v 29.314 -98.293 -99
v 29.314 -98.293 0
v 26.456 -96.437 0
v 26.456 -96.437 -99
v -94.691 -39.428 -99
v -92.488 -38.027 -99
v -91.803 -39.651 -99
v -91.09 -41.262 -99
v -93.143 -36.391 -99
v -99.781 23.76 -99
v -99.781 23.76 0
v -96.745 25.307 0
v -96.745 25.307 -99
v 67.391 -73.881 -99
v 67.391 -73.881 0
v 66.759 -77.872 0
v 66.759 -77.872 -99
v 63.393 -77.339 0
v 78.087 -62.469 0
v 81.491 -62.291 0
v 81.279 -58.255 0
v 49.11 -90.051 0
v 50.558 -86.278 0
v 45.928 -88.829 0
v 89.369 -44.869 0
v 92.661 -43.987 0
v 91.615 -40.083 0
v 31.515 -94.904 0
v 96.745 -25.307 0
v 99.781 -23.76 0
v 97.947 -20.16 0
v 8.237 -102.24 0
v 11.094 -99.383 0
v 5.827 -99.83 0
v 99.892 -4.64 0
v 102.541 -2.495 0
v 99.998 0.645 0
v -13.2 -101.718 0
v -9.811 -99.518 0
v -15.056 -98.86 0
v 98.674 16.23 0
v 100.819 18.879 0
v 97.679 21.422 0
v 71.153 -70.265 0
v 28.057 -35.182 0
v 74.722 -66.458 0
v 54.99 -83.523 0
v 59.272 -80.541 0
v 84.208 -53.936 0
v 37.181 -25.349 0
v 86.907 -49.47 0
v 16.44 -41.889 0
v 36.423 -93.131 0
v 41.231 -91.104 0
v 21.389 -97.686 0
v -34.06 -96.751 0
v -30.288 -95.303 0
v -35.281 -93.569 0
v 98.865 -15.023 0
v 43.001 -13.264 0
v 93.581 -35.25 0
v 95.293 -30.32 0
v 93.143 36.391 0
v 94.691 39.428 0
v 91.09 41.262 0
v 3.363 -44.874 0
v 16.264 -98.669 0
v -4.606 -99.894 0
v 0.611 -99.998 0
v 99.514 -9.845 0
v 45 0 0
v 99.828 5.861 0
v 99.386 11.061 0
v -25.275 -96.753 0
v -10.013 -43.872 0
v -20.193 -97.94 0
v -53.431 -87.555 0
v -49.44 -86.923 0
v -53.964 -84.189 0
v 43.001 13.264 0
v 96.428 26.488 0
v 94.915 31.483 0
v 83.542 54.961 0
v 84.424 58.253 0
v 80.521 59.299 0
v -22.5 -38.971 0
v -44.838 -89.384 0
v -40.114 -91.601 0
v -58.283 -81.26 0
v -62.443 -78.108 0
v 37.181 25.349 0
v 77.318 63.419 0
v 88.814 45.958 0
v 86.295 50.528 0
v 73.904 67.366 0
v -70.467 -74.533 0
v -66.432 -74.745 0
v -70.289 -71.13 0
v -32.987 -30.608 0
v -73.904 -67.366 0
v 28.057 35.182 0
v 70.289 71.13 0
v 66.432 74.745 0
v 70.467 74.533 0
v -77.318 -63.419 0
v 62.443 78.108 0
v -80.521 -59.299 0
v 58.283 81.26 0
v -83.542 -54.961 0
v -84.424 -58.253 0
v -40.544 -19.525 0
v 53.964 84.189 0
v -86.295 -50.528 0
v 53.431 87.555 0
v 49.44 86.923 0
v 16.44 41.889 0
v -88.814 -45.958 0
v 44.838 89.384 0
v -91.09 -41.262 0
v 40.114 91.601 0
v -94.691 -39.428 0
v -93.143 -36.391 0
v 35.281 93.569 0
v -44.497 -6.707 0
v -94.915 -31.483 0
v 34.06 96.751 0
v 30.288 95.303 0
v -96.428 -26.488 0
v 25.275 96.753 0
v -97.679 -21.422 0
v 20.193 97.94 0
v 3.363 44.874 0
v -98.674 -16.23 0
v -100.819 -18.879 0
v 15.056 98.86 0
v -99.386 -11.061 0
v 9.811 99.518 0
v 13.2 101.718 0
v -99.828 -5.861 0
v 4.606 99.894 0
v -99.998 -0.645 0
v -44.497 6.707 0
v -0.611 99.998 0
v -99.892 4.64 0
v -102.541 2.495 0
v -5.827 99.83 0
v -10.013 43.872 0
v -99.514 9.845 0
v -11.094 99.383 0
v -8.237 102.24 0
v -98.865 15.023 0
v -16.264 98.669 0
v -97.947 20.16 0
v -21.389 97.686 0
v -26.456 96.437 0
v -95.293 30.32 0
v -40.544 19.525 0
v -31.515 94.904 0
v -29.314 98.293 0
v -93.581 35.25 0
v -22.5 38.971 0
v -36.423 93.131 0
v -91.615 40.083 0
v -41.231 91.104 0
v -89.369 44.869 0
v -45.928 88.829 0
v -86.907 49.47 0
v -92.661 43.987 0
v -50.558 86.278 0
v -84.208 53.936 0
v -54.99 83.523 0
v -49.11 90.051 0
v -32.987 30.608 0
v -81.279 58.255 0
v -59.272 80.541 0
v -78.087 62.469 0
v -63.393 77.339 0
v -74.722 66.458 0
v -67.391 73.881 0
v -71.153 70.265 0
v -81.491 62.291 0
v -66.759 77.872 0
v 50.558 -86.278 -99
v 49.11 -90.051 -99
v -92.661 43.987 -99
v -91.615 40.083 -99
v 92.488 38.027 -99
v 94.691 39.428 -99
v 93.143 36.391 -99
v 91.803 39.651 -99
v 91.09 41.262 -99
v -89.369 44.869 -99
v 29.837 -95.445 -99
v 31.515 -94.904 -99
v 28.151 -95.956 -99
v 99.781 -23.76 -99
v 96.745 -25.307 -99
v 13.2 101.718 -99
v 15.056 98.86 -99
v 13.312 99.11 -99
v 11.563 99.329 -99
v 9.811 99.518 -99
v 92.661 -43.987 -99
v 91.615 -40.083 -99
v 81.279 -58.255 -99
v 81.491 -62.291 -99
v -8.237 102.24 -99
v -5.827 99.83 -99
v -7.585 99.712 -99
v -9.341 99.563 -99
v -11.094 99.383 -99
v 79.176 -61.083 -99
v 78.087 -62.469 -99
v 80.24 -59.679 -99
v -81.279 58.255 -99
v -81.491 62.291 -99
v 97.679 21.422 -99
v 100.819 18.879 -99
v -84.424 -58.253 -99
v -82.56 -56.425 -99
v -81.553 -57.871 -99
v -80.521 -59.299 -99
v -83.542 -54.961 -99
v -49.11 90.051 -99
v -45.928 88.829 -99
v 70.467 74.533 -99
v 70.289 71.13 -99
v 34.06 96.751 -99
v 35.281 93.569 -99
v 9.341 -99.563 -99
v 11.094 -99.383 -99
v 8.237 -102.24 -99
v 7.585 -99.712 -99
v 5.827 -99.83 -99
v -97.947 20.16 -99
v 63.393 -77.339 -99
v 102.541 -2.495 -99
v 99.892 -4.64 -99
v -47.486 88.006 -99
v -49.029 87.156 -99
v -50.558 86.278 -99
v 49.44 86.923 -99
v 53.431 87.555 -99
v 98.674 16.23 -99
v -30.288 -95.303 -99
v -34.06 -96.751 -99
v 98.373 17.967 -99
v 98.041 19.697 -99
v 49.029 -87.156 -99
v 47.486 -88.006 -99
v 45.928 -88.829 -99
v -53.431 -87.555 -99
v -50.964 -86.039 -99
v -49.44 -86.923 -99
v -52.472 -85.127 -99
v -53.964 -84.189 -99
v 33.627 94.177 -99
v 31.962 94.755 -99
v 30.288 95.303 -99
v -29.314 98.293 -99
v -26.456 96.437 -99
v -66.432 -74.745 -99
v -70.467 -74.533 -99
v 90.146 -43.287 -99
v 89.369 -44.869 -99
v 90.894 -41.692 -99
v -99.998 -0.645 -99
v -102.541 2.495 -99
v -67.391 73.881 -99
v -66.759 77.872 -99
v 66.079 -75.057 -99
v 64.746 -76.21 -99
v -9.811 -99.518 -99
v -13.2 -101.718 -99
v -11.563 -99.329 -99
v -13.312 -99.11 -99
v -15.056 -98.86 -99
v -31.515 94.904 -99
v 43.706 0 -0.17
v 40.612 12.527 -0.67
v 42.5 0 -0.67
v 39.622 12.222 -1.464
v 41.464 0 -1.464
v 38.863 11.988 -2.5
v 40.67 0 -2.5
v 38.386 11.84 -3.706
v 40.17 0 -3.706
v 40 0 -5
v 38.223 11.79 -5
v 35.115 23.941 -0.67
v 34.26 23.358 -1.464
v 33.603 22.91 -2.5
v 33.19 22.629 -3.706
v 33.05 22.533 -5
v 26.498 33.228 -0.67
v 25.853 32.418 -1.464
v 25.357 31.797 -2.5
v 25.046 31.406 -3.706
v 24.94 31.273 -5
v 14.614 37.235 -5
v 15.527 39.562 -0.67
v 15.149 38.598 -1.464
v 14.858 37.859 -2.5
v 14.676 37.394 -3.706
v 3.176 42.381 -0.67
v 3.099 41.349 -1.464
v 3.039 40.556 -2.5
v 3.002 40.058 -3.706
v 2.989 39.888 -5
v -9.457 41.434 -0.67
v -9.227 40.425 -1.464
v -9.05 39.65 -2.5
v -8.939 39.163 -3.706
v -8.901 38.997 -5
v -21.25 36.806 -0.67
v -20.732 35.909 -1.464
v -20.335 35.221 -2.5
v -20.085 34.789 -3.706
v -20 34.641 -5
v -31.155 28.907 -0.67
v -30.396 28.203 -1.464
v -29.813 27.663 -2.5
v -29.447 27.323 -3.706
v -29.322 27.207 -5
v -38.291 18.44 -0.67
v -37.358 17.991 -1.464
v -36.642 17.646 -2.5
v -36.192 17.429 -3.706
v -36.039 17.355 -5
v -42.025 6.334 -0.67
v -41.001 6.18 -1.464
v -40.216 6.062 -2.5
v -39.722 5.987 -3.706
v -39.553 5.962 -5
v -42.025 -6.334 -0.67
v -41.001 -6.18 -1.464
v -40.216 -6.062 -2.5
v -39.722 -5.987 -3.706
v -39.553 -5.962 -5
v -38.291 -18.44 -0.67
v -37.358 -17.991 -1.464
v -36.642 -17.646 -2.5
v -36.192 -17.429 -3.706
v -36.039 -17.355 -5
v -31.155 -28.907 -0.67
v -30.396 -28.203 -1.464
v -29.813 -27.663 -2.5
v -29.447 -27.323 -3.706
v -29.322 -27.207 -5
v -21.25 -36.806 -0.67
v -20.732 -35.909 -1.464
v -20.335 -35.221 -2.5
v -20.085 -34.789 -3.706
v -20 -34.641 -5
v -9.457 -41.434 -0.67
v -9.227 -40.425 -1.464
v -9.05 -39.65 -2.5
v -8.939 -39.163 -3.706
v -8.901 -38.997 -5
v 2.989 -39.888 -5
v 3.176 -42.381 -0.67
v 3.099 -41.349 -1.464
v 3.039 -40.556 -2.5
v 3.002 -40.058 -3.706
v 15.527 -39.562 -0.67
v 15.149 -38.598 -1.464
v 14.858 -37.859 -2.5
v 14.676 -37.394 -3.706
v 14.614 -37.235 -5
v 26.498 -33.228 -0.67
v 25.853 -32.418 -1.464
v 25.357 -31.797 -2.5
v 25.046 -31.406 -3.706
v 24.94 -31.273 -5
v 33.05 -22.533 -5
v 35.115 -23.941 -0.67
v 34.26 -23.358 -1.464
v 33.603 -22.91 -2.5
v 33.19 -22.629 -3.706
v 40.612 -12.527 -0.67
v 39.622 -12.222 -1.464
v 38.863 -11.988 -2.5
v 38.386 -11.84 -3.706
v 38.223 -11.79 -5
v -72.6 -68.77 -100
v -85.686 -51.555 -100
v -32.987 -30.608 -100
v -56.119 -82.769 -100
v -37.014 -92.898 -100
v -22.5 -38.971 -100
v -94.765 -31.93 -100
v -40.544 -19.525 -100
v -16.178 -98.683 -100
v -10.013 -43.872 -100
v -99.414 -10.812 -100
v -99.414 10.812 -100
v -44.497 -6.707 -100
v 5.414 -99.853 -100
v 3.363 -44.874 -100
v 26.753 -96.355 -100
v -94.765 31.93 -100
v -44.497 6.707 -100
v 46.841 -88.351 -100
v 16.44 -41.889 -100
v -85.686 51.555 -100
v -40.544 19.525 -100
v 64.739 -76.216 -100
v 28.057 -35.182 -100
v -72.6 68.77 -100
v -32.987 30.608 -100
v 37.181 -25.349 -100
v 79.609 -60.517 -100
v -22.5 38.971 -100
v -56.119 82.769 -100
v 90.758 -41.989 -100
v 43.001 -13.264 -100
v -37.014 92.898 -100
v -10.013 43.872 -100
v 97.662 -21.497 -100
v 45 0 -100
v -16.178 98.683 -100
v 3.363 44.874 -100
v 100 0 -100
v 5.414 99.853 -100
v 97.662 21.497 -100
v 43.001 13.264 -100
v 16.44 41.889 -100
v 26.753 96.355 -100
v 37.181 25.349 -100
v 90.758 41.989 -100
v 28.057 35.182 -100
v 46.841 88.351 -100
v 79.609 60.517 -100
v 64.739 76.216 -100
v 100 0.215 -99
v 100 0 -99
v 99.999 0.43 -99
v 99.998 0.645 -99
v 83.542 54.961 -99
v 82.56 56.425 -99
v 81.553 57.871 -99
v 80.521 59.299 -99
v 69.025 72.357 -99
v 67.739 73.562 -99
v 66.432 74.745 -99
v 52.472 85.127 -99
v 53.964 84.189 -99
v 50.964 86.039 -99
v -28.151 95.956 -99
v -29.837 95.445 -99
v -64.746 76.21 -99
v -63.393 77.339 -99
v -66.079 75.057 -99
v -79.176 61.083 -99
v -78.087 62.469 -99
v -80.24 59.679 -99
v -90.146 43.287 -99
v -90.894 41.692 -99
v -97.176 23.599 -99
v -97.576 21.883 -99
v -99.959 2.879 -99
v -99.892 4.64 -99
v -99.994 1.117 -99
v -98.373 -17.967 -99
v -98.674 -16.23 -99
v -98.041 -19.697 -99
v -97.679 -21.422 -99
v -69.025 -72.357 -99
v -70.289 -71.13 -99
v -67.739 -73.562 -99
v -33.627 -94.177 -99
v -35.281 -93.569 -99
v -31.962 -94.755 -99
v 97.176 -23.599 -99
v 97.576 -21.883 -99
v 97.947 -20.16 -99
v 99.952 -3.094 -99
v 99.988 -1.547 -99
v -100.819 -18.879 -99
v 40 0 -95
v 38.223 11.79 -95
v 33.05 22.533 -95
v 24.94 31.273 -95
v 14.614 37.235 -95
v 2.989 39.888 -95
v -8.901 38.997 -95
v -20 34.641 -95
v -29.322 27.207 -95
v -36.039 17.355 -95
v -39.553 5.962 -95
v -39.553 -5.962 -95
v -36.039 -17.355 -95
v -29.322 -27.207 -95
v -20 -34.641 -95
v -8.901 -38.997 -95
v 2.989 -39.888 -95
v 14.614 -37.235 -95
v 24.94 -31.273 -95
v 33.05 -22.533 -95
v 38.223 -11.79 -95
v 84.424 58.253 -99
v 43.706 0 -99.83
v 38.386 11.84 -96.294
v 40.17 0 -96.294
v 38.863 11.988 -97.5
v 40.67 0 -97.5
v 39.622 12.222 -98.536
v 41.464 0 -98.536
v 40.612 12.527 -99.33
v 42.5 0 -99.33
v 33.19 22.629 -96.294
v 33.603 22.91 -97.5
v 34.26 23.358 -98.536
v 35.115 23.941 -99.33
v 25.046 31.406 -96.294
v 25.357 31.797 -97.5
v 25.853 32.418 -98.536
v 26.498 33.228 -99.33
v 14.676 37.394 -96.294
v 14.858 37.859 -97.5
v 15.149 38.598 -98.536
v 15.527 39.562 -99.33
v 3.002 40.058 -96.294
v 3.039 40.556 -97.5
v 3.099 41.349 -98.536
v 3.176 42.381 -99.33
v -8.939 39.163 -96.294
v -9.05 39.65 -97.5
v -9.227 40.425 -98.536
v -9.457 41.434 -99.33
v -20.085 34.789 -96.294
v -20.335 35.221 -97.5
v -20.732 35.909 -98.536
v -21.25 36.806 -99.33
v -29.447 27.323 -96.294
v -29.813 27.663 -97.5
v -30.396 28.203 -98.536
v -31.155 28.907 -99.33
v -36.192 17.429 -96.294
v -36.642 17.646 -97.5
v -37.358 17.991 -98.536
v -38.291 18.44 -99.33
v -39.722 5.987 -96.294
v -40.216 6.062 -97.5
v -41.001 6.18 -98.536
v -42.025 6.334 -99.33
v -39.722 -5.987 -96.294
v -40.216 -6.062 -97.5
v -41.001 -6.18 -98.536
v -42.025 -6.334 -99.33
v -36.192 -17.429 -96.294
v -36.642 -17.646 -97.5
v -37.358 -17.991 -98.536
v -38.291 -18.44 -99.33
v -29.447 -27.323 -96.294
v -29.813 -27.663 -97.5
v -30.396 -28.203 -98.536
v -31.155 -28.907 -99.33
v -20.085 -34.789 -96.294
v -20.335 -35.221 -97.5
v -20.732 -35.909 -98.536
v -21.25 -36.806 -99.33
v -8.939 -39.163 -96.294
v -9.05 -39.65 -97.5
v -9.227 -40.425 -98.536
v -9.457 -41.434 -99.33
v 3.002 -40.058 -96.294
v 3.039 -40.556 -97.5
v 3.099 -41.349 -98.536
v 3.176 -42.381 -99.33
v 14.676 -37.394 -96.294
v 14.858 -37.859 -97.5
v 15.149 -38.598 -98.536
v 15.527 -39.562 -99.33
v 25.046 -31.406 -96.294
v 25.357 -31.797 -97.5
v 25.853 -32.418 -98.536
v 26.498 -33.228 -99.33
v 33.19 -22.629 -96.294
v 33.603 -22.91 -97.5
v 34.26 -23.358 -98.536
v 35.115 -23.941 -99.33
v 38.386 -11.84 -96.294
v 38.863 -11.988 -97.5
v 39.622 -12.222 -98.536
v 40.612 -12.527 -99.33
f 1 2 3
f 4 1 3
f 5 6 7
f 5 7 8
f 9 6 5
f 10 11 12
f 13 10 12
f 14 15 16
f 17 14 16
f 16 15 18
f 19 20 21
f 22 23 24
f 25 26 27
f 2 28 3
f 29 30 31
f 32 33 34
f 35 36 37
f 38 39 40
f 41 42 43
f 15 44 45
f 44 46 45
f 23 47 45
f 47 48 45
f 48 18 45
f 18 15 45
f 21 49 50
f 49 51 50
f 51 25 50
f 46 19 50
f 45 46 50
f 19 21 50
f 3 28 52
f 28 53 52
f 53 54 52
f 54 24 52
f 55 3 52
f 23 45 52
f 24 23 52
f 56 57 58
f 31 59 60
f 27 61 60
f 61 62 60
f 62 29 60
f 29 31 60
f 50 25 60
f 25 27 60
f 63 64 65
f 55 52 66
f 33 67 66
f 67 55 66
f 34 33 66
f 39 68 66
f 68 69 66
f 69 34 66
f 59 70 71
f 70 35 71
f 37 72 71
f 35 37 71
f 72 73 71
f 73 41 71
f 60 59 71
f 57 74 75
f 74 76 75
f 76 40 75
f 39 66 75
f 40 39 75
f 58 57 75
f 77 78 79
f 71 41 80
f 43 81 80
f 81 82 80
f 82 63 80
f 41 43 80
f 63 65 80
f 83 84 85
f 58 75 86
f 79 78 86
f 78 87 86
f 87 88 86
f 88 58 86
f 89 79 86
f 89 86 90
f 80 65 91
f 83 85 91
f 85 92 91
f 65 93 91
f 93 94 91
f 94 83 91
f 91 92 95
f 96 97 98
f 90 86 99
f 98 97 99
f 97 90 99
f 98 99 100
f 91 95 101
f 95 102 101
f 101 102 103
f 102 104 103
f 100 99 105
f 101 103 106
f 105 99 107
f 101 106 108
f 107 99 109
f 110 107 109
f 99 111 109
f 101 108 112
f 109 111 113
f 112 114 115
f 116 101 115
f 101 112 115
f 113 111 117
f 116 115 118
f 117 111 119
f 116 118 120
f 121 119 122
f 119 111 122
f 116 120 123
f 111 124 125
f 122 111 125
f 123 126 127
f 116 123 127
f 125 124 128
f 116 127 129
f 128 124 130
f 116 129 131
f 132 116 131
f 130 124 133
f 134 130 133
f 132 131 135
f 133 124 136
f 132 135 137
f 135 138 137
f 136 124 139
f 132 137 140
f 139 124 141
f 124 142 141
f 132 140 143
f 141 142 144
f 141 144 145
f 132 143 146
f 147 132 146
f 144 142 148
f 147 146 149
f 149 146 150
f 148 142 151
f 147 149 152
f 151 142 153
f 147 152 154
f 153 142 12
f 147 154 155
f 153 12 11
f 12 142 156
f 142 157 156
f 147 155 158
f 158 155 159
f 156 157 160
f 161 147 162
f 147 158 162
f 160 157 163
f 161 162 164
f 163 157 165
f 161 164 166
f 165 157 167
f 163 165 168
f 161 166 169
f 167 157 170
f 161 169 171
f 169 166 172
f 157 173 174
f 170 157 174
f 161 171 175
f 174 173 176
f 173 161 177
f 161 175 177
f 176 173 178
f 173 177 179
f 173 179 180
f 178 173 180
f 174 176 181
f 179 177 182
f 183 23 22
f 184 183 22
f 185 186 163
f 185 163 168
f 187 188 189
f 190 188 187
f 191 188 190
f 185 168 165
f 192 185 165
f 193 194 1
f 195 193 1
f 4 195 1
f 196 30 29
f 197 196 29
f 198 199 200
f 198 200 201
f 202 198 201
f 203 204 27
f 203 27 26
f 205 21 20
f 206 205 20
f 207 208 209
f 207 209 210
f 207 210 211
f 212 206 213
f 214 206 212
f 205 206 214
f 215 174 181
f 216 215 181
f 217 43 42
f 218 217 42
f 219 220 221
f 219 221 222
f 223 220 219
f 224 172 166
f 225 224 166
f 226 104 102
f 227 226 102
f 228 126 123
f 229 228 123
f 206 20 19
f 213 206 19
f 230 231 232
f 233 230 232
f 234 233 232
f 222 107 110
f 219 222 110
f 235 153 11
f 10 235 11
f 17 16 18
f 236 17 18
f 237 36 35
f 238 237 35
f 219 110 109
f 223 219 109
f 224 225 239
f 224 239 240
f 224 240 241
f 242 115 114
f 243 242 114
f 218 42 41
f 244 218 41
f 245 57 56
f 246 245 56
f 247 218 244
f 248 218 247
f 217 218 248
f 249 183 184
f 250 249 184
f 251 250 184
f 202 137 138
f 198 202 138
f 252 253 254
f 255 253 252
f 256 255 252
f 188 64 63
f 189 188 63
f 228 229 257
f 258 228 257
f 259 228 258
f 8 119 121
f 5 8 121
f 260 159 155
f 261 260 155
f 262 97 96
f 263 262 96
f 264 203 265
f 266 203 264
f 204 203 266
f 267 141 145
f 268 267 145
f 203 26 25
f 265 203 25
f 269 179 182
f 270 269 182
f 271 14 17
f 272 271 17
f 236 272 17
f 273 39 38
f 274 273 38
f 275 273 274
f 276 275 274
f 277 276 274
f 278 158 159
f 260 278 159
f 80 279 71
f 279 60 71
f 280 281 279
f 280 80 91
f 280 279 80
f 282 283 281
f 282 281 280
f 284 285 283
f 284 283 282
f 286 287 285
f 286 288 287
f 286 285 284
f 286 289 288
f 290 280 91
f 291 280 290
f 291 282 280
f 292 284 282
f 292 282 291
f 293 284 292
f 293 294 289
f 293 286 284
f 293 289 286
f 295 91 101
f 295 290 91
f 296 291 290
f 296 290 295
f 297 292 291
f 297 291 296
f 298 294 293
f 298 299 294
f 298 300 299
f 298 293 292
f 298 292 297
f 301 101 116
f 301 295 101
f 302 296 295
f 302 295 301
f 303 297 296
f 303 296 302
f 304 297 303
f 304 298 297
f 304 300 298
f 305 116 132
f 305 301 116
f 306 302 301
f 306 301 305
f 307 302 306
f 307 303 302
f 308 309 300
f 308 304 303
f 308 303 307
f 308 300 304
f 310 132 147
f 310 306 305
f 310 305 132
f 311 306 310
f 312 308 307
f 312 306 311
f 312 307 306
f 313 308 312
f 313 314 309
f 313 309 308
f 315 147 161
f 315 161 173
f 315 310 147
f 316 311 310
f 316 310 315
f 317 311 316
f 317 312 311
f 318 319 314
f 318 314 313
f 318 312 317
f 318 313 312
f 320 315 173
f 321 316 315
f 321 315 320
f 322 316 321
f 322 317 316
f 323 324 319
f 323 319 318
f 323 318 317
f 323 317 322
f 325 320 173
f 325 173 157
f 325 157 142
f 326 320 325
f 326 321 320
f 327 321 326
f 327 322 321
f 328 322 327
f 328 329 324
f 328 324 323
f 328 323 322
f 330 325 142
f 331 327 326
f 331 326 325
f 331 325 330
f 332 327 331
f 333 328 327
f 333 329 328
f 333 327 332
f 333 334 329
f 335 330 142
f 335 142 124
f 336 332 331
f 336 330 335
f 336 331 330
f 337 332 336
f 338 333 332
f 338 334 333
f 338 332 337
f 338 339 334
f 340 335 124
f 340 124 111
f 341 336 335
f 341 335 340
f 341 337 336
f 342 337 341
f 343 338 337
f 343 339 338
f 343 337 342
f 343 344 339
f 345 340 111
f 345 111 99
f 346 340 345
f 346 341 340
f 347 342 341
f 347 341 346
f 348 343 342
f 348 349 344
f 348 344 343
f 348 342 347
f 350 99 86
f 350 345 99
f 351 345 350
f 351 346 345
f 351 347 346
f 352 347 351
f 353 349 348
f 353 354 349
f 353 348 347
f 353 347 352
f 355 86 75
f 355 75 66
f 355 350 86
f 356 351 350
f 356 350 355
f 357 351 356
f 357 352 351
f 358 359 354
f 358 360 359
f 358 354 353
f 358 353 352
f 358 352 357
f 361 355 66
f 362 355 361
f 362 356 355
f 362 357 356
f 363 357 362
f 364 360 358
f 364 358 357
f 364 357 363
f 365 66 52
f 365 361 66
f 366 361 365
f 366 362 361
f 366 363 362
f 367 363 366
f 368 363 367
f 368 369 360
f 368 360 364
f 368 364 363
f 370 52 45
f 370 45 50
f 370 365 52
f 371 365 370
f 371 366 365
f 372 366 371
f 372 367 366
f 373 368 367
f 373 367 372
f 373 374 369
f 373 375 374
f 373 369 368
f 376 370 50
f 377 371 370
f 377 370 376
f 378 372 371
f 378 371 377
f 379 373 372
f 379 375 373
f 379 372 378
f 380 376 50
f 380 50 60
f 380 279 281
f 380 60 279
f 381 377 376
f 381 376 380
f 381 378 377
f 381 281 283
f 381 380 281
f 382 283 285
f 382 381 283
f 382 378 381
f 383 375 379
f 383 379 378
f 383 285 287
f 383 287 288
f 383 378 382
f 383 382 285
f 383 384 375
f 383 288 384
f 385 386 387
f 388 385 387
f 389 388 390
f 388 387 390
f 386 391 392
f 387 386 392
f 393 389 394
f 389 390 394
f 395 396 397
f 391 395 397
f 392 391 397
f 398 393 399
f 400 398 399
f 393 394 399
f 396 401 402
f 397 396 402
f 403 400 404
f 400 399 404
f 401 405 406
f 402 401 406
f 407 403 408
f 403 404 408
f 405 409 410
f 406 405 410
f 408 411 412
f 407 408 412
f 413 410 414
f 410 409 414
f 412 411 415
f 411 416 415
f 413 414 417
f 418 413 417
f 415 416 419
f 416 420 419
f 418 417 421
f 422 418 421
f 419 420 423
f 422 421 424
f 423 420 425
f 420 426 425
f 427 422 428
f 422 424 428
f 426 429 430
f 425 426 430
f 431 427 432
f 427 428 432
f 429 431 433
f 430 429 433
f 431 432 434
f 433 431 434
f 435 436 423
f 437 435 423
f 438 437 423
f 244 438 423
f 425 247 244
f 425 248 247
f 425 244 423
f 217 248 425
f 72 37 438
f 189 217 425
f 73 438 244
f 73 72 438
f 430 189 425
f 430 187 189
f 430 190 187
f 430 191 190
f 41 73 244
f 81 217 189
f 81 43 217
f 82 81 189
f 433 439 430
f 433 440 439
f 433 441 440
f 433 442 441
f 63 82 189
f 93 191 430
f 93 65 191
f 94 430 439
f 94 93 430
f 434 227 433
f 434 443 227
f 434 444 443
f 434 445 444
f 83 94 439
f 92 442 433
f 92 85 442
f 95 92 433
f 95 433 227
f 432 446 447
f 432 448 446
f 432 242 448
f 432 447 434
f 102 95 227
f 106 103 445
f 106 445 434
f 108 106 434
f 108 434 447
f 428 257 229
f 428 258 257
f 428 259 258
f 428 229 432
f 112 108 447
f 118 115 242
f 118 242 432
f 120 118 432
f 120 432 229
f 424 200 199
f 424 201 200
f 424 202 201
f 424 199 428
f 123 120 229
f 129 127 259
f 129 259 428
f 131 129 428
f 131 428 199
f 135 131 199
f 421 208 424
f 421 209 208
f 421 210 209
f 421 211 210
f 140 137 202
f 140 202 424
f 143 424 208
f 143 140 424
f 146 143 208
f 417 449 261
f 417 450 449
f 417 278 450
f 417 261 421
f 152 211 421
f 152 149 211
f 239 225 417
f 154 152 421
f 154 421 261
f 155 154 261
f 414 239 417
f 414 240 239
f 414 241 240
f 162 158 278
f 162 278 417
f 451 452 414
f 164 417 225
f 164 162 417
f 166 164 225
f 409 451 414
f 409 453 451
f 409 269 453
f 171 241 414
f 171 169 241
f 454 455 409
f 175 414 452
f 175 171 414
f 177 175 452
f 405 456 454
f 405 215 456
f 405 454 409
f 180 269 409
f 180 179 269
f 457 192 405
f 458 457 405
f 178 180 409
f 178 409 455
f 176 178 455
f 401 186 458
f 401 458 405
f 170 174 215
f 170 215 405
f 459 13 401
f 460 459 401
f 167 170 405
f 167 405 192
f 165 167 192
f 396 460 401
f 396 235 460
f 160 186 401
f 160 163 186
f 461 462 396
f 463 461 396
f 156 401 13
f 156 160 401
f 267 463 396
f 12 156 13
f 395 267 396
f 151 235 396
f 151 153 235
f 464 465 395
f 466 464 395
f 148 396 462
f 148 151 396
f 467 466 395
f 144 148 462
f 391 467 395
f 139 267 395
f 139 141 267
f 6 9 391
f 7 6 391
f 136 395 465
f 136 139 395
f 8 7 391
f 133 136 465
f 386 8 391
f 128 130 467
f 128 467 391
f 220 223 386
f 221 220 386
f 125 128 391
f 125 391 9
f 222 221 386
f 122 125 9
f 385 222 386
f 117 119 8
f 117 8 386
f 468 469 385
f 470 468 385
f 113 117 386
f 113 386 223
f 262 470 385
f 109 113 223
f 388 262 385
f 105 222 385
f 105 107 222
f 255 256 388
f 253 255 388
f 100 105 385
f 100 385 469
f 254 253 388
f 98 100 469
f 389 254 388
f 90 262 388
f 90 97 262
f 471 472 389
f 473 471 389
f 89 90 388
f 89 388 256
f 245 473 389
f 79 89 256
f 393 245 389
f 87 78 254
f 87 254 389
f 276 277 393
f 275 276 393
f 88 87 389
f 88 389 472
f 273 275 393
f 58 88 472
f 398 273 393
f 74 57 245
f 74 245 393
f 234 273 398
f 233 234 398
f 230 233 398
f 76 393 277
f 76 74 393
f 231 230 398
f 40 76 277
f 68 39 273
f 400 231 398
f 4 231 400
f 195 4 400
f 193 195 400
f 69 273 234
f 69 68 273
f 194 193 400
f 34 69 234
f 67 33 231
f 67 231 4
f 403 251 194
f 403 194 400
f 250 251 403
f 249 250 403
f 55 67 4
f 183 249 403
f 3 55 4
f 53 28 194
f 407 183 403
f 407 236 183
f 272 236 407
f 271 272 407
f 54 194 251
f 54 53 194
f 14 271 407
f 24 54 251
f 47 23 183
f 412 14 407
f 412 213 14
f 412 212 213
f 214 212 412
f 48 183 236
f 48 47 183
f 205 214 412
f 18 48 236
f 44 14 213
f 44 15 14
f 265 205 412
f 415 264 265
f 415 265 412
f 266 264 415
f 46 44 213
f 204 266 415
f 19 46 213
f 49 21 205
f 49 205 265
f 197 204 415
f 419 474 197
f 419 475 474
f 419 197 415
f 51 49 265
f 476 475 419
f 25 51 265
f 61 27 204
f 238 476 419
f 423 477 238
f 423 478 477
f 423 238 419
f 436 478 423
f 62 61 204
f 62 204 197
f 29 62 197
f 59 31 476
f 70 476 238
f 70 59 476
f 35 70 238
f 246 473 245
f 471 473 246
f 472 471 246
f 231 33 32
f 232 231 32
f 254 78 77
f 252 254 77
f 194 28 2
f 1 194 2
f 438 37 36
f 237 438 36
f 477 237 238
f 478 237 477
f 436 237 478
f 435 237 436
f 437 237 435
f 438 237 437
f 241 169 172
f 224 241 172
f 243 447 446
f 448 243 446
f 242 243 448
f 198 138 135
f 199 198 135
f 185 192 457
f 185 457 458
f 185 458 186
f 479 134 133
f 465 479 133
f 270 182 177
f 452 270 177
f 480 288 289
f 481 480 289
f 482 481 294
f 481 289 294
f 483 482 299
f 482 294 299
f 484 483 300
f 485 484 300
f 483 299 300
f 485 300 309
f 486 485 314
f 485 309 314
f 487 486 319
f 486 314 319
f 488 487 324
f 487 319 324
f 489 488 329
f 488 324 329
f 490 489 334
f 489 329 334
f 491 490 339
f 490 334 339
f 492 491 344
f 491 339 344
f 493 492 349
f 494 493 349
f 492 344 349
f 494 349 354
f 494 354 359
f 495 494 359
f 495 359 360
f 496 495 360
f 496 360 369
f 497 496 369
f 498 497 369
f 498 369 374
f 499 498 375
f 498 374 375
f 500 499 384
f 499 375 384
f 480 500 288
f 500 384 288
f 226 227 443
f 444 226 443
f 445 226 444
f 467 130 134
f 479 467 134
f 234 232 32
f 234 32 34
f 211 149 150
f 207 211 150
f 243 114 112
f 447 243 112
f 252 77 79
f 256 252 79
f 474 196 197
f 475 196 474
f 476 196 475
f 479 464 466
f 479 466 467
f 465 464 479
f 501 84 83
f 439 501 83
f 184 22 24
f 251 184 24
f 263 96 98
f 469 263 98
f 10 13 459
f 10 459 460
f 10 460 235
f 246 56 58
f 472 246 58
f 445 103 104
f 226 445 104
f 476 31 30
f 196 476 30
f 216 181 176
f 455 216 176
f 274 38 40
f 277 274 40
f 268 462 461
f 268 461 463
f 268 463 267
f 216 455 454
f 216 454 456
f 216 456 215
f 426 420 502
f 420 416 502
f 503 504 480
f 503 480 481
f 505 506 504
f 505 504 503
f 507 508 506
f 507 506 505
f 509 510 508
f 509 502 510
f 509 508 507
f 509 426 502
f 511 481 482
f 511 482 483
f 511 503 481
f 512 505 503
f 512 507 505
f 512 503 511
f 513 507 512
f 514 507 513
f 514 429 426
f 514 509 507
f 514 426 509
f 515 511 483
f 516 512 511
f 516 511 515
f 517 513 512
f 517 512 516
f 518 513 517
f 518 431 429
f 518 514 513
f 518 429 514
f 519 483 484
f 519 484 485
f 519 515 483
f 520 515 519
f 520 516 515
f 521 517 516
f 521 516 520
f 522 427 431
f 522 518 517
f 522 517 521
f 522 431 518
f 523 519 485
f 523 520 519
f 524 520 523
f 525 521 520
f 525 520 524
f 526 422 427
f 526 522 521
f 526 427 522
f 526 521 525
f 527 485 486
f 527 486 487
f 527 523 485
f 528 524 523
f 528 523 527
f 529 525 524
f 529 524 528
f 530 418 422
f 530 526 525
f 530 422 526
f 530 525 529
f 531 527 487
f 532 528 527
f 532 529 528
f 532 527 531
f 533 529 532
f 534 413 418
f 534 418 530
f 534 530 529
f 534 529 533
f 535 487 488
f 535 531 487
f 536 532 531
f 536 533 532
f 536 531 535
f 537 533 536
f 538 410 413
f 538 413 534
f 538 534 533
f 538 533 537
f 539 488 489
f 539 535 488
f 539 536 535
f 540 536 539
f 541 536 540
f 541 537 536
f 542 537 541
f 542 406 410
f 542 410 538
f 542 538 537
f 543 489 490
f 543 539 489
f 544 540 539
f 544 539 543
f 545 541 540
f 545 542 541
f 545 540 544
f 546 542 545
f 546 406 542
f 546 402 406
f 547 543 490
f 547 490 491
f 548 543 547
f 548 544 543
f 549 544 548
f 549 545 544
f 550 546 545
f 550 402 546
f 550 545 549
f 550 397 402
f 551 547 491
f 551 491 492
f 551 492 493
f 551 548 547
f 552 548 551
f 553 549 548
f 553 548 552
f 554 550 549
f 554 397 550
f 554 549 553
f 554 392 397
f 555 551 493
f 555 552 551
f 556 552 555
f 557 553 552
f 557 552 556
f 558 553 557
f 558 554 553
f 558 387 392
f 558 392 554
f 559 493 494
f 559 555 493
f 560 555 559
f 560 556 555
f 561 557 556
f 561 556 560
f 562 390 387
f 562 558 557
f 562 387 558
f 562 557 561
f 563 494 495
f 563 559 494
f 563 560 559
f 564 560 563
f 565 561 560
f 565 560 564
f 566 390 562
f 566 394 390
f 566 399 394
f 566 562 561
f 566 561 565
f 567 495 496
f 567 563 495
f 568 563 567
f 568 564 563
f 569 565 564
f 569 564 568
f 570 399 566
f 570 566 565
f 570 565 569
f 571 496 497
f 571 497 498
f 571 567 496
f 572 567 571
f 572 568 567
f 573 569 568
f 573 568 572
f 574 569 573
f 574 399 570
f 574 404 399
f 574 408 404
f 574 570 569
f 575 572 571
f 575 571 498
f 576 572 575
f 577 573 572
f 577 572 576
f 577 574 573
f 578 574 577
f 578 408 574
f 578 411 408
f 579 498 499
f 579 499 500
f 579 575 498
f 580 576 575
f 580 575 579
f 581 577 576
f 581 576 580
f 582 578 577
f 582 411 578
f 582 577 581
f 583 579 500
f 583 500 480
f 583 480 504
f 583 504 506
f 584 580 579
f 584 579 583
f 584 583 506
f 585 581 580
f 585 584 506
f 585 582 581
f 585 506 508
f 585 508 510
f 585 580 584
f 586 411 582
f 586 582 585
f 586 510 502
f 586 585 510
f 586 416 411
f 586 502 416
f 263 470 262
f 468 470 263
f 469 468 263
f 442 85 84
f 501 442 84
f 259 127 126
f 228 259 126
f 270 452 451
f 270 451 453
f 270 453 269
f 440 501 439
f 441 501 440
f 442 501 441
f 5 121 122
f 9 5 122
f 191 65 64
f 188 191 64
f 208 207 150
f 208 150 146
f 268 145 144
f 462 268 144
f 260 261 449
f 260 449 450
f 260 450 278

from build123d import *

# Parameters (mm, degrees)
SKETCH2_R           = 100
SKETCH2_R_2         = 50
BOSS_EXTRUDE2_DEPTH = 100
SKETCH3_R           = 50
BOSS_EXTRUDE3_DEPTH = 100
SKETCH4_R           = 40
CUT_EXTRUDE1_DEPTH  = 100
FILLET1_R           = 5
FILLET2_R           = 5
BOSS_EXTRUDE4_DEPTH = 99


with BuildPart() as part:
    # Sketch2 → Boss-Extrude2 (new body)
    with BuildSketch(Plane.XY):
        Circle(SKETCH2_R)
        Circle(SKETCH2_R_2, mode=Mode.SUBTRACT)
    extrude(amount=-BOSS_EXTRUDE2_DEPTH)

    # Sketch3 → Boss-Extrude3 (add)
    with BuildSketch(Plane.XY):
        Circle(SKETCH3_R)
    extrude(amount=-BOSS_EXTRUDE3_DEPTH)

    # Sketch4 → Cut-Extrude1 (cut)
    with BuildSketch(Plane.XY):
        Circle(SKETCH4_R)
    extrude(amount=-CUT_EXTRUDE1_DEPTH, mode=Mode.SUBTRACT)

    # Fillet1
    fillet1_edges = [part.edges().sort_by_distance(p)[0] for p in [
        (-40, 0, 0),
    ]]
    fillet(fillet1_edges, radius=FILLET1_R)

    # Fillet2
    fillet2_edges = [part.edges().sort_by_distance(p)[0] for p in [
        (-40, 0, -100),
    ]]
    fillet(fillet2_edges, radius=FILLET2_R)

    # Sketch9 → Boss-Extrude4 (add)
    with BuildSketch(Plane.XY):
        with BuildLine():
            Line((-11.094188182, 99.382689582), (-8.236971303, 102.239906461))
            Line((-8.236971303, 102.239906461), (-5.827142523, 99.830077682))
            ThreePointArc((-5.827142523, 99.830077682), (-8.463621993, 99.641191797), (-11.094188182, 99.382689582))
        make_face()
        with BuildLine():
            Line((13.199898104, 101.718281835), (15.056034767, 98.86008202))
            ThreePointArc((15.056034767, 98.86008202), (12.437897116, 99.22347865), (9.811069477, 99.517550792))
            Line((9.811069477, 99.517550792), (13.199898104, 101.718281835))
        make_face()
        with BuildLine():
            Line((34.059868624, 96.751080194), (35.281191091, 93.569426391))
            ThreePointArc((35.281191091, 93.569426391), (32.795820437, 94.469223358), (30.287536321, 95.303017495))
            Line((30.287536321, 95.303017495), (34.059868624, 96.751080194))
        make_face()
        with BuildLine():
            Line((53.431259448, 87.555392086), (53.964390067, 84.189337833))
            ThreePointArc((53.964390067, 84.189337833), (51.720409033, 85.586209692), (49.440292492, 86.923285018))
            Line((49.440292492, 86.923285018), (53.431259448, 87.555392086))
        make_face()
        with BuildLine():
            Line((70.467447842, 74.533113206), (70.289086246, 71.129771226))
            ThreePointArc((70.289086246, 71.129771226), (68.384567572, 72.962667974), (66.43227064, 74.744587882))
            Line((66.43227064, 74.744587882), (70.467447842, 74.533113206))
        make_face()
        with BuildLine():
            Line((84.423870625, 58.253379629), (83.541812073, 54.961492298))
            ThreePointArc((83.541812073, 54.961492298), (82.059992363, 57.150307552), (80.520839784, 59.299193591))
            Line((80.520839784, 59.299193591), (84.423870625, 58.253379629))
        make_face()
        with BuildLine():
            Line((94.690565151, 39.427693832), (93.143359833, 36.391132422))
            ThreePointArc((93.143359833, 36.391132422), (92.14900172, 38.840204453), (91.090261847, 41.262139991))
            Line((91.090261847, 41.262139991), (94.690565151, 39.427693832))
        make_face()
        with BuildLine():
            Line((100.818827604, 18.878828619), (98.674095818, 16.230305435))
            ThreePointArc((98.674095818, 16.230305435), (98.210657522, 18.832598043), (97.678602368, 21.421732876))
            Line((97.678602368, 21.421732876), (100.818827604, 18.878828619))
        make_face()
        with BuildLine():
            Line((102.540823508, -2.495131995), (99.892300324, -4.639863781))
            ThreePointArc((99.892300324, -4.639863781), (99.980036323, -1.998083271), (99.997919252, 0.645093241))
            Line((99.997919252, 0.645093241), (102.540823508, -2.495131995))
        make_face()
        with BuildLine():
            Line((99.78129338, -23.760043368), (96.74473197, -25.307248685))
            ThreePointArc((96.74473197, -25.307248685), (97.37980778, -22.741438757), (97.946847221, -20.159740064))
            Line((97.946847221, -20.159740064), (99.78129338, -23.760043368))
        make_face()
        with BuildLine():
            Line((92.660841927, -43.986526832), (89.368954596, -44.868585384))
            ThreePointArc((89.368954596, -44.868585384), (90.523614356, -42.490884245), (91.615027965, -40.083495991))
            Line((91.615027965, -40.083495991), (92.660841927, -43.986526832))
        make_face()
        with BuildLine():
            Line((81.490667046, -62.290588003), (78.087325067, -62.468949599))
            ThreePointArc((78.087325067, -62.468949599), (79.711104604, -60.383274197), (81.27919237, -58.255410802))
            Line((81.27919237, -58.255410802), (81.490667046, -62.290588003))
        make_face()
        with BuildLine():
            Line((66.75895898, -77.872251575), (63.392904727, -77.339120956))
            ThreePointArc((63.392904727, -77.339120956), (65.414837085, -75.636625315), (67.391066047, -73.881284619))
            Line((67.391066047, -73.881284619), (66.75895898, -77.872251575))
        make_face()
        with BuildLine():
            Line((49.109564061, -90.050524081), (45.927910258, -88.829201614))
            ThreePointArc((45.927910258, -88.829201614), (48.25962729, -87.584292963), (50.55762676, -86.278191777))
            Line((50.55762676, -86.278191777), (49.109564061, -90.050524081))
        make_face()
        with BuildLine():
            Line((29.313845538, -98.293156574), (26.455645724, -96.437019911))
            ThreePointArc((26.455645724, -96.437019911), (28.995240207, -95.704106732), (31.514576581, -94.904327946))
            Line((31.514576581, -94.904327946), (29.313845538, -98.293156574))
        make_face()
        with BuildLine():
            Line((8.236971303, -102.239906461), (5.827142523, -99.830077682))
            ThreePointArc((5.827142523, -99.830077682), (8.463621993, -99.641191797), (11.094188182, -99.382689582))
            Line((11.094188182, -99.382689582), (8.236971303, -102.239906461))
        make_face()
        with BuildLine():
            Line((-13.199898104, -101.718281835), (-15.056034767, -98.86008202))
            ThreePointArc((-15.056034767, -98.86008202), (-12.437897116, -99.22347865), (-9.811069477, -99.517550792))
            Line((-9.811069477, -99.517550792), (-13.199898104, -101.718281835))
        make_face()
        with BuildLine():
            Line((-34.059868624, -96.751080194), (-35.281191091, -93.569426391))
            ThreePointArc((-35.281191091, -93.569426391), (-32.795820437, -94.469223358), (-30.287536321, -95.303017495))
            Line((-30.287536321, -95.303017495), (-34.059868624, -96.751080194))
        make_face()
        with BuildLine():
            Line((-53.431259448, -87.555392086), (-53.964390067, -84.189337833))
            ThreePointArc((-53.964390067, -84.189337833), (-51.720409033, -85.586209692), (-49.440292492, -86.923285018))
            Line((-49.440292492, -86.923285018), (-53.431259448, -87.555392086))
        make_face()
        with BuildLine():
            Line((-70.467447842, -74.533113206), (-70.289086246, -71.129771226))
            ThreePointArc((-70.289086246, -71.129771226), (-68.384567572, -72.962667974), (-66.43227064, -74.744587882))
            Line((-66.43227064, -74.744587882), (-70.467447842, -74.533113206))
        make_face()
        with BuildLine():
            Line((-84.423870625, -58.253379629), (-83.541812073, -54.961492298))
            ThreePointArc((-83.541812073, -54.961492298), (-82.059992363, -57.150307552), (-80.520839784, -59.299193591))
            Line((-80.520839784, -59.299193591), (-84.423870625, -58.253379629))
        make_face()
        with BuildLine():
            Line((-94.690565151, -39.427693832), (-93.143359833, -36.391132422))
            ThreePointArc((-93.143359833, -36.391132422), (-92.14900172, -38.840204453), (-91.090261847, -41.262139991))
            Line((-91.090261847, -41.262139991), (-94.690565151, -39.427693832))
        make_face()
        with BuildLine():
            Line((-100.818827604, -18.878828619), (-98.674095818, -16.230305435))
            ThreePointArc((-98.674095818, -16.230305435), (-98.210657522, -18.832598043), (-97.678602368, -21.421732875))
            Line((-97.678602368, -21.421732875), (-100.818827604, -18.878828619))
        make_face()
        with BuildLine():
            Line((-102.540823508, 2.495131995), (-99.892300324, 4.639863781))
            ThreePointArc((-99.892300324, 4.639863781), (-99.980036323, 1.998083271), (-99.997919252, -0.645093241))
            Line((-99.997919252, -0.645093241), (-102.540823508, 2.495131995))
        make_face()
        with BuildLine():
            Line((-99.78129338, 23.760043368), (-96.74473197, 25.307248685))
            ThreePointArc((-96.74473197, 25.307248685), (-97.37980778, 22.741438757), (-97.946847221, 20.159740064))
            Line((-97.946847221, 20.159740064), (-99.78129338, 23.760043368))
        make_face()
        with BuildLine():
            Line((-92.660841927, 43.986526832), (-89.368954596, 44.868585384))
            ThreePointArc((-89.368954596, 44.868585384), (-90.523614356, 42.490884245), (-91.615027965, 40.083495991))
            Line((-91.615027965, 40.083495991), (-92.660841927, 43.986526832))
        make_face()
        with BuildLine():
            Line((-81.490667046, 62.290588003), (-78.087325067, 62.468949599))
            ThreePointArc((-78.087325067, 62.468949599), (-79.711104604, 60.383274197), (-81.27919237, 58.255410802))
            Line((-81.27919237, 58.255410802), (-81.490667046, 62.290588003))
        make_face()
        with BuildLine():
            Line((-66.75895898, 77.872251575), (-63.392904727, 77.339120956))
            ThreePointArc((-63.392904727, 77.339120956), (-65.414837085, 75.636625315), (-67.391066047, 73.881284619))
            Line((-67.391066047, 73.881284619), (-66.75895898, 77.872251575))
        make_face()
        with BuildLine():
            Line((-49.109564061, 90.050524081), (-45.927910258, 88.829201614))
            ThreePointArc((-45.927910258, 88.829201614), (-48.25962729, 87.584292963), (-50.55762676, 86.278191777))
            Line((-50.55762676, 86.278191777), (-49.109564061, 90.050524081))
        make_face()
        with BuildLine():
            Line((-29.313845538, 98.293156574), (-26.455645724, 96.437019911))
            ThreePointArc((-26.455645724, 96.437019911), (-28.995240207, 95.704106732), (-31.514576581, 94.904327946))
            Line((-31.514576581, 94.904327946), (-29.313845538, 98.293156574))
        make_face()
    extrude(amount=-BOSS_EXTRUDE4_DEPTH)


solid = part.part
